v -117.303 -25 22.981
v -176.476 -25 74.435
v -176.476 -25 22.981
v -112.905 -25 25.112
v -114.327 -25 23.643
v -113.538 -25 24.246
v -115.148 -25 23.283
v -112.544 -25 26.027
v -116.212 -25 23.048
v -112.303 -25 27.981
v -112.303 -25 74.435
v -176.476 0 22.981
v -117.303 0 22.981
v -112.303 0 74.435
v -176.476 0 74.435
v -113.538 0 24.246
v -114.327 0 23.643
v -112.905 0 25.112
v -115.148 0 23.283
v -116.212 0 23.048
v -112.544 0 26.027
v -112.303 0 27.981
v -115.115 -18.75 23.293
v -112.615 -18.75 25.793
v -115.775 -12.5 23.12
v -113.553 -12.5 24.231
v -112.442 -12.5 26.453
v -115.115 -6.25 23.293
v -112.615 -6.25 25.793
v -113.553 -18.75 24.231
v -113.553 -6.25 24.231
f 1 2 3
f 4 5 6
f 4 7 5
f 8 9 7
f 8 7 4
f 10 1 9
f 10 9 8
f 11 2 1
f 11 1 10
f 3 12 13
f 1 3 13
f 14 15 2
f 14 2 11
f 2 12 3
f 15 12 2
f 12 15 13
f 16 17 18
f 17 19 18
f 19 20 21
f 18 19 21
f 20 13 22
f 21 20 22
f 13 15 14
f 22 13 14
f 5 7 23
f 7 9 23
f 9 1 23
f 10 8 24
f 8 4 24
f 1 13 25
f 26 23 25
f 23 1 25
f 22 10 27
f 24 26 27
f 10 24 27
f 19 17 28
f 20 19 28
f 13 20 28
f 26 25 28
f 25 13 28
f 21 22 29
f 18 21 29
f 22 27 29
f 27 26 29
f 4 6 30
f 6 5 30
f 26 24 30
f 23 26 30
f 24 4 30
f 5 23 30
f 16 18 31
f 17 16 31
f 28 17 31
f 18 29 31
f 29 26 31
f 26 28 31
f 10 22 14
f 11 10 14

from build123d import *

# Parameters (mm, degrees)
F0_W        = 64.1731321812
F0_H        = 51.4541268349
F1_DEPTH    = 25
F2_T1_DEPTH = 50


# Not quite as in the source:
# - a fillet or chamfer that OpenCascade refuses, or shapes differently, is made with other operations: its cross-section is extruded or revolved along the edge and cut away or added


with BuildPart() as f1:
    # F0 (on Front) → F1 (new body)
    with BuildSketch(Plane.XZ):
        with Locations((-144.389539957, 48.7079843879)):
            Rectangle(F0_W, F0_H)
    extrude(amount=F1_DEPTH)

    # F2: fillet of radius 5 on 1 edges, made by hand

    # F2_s2 → F2_t1 (cut)
    with BuildSketch(Plane.XZ.offset(-12.5)):
        with BuildLine():
            add(Edge.make_bspline(
                [(-117.3029738665, 22.9809209704), (-112.3029738665, 22.9809209704), (-112.3029738665, 27.9809209704)],
                knots=[0, 0, 0, 1, 1, 1], degree=2, weights=[1, 1, 1]))
            Line((-112.3029738665, 27.9809209704), (-112.3029738665, 22.9809209704))
            Line((-112.3029738665, 22.9809209704), (-117.3029738665, 22.9809209704))
        make_face()
    extrude(amount=F2_T1_DEPTH, mode=Mode.SUBTRACT)


solid = f1.part
